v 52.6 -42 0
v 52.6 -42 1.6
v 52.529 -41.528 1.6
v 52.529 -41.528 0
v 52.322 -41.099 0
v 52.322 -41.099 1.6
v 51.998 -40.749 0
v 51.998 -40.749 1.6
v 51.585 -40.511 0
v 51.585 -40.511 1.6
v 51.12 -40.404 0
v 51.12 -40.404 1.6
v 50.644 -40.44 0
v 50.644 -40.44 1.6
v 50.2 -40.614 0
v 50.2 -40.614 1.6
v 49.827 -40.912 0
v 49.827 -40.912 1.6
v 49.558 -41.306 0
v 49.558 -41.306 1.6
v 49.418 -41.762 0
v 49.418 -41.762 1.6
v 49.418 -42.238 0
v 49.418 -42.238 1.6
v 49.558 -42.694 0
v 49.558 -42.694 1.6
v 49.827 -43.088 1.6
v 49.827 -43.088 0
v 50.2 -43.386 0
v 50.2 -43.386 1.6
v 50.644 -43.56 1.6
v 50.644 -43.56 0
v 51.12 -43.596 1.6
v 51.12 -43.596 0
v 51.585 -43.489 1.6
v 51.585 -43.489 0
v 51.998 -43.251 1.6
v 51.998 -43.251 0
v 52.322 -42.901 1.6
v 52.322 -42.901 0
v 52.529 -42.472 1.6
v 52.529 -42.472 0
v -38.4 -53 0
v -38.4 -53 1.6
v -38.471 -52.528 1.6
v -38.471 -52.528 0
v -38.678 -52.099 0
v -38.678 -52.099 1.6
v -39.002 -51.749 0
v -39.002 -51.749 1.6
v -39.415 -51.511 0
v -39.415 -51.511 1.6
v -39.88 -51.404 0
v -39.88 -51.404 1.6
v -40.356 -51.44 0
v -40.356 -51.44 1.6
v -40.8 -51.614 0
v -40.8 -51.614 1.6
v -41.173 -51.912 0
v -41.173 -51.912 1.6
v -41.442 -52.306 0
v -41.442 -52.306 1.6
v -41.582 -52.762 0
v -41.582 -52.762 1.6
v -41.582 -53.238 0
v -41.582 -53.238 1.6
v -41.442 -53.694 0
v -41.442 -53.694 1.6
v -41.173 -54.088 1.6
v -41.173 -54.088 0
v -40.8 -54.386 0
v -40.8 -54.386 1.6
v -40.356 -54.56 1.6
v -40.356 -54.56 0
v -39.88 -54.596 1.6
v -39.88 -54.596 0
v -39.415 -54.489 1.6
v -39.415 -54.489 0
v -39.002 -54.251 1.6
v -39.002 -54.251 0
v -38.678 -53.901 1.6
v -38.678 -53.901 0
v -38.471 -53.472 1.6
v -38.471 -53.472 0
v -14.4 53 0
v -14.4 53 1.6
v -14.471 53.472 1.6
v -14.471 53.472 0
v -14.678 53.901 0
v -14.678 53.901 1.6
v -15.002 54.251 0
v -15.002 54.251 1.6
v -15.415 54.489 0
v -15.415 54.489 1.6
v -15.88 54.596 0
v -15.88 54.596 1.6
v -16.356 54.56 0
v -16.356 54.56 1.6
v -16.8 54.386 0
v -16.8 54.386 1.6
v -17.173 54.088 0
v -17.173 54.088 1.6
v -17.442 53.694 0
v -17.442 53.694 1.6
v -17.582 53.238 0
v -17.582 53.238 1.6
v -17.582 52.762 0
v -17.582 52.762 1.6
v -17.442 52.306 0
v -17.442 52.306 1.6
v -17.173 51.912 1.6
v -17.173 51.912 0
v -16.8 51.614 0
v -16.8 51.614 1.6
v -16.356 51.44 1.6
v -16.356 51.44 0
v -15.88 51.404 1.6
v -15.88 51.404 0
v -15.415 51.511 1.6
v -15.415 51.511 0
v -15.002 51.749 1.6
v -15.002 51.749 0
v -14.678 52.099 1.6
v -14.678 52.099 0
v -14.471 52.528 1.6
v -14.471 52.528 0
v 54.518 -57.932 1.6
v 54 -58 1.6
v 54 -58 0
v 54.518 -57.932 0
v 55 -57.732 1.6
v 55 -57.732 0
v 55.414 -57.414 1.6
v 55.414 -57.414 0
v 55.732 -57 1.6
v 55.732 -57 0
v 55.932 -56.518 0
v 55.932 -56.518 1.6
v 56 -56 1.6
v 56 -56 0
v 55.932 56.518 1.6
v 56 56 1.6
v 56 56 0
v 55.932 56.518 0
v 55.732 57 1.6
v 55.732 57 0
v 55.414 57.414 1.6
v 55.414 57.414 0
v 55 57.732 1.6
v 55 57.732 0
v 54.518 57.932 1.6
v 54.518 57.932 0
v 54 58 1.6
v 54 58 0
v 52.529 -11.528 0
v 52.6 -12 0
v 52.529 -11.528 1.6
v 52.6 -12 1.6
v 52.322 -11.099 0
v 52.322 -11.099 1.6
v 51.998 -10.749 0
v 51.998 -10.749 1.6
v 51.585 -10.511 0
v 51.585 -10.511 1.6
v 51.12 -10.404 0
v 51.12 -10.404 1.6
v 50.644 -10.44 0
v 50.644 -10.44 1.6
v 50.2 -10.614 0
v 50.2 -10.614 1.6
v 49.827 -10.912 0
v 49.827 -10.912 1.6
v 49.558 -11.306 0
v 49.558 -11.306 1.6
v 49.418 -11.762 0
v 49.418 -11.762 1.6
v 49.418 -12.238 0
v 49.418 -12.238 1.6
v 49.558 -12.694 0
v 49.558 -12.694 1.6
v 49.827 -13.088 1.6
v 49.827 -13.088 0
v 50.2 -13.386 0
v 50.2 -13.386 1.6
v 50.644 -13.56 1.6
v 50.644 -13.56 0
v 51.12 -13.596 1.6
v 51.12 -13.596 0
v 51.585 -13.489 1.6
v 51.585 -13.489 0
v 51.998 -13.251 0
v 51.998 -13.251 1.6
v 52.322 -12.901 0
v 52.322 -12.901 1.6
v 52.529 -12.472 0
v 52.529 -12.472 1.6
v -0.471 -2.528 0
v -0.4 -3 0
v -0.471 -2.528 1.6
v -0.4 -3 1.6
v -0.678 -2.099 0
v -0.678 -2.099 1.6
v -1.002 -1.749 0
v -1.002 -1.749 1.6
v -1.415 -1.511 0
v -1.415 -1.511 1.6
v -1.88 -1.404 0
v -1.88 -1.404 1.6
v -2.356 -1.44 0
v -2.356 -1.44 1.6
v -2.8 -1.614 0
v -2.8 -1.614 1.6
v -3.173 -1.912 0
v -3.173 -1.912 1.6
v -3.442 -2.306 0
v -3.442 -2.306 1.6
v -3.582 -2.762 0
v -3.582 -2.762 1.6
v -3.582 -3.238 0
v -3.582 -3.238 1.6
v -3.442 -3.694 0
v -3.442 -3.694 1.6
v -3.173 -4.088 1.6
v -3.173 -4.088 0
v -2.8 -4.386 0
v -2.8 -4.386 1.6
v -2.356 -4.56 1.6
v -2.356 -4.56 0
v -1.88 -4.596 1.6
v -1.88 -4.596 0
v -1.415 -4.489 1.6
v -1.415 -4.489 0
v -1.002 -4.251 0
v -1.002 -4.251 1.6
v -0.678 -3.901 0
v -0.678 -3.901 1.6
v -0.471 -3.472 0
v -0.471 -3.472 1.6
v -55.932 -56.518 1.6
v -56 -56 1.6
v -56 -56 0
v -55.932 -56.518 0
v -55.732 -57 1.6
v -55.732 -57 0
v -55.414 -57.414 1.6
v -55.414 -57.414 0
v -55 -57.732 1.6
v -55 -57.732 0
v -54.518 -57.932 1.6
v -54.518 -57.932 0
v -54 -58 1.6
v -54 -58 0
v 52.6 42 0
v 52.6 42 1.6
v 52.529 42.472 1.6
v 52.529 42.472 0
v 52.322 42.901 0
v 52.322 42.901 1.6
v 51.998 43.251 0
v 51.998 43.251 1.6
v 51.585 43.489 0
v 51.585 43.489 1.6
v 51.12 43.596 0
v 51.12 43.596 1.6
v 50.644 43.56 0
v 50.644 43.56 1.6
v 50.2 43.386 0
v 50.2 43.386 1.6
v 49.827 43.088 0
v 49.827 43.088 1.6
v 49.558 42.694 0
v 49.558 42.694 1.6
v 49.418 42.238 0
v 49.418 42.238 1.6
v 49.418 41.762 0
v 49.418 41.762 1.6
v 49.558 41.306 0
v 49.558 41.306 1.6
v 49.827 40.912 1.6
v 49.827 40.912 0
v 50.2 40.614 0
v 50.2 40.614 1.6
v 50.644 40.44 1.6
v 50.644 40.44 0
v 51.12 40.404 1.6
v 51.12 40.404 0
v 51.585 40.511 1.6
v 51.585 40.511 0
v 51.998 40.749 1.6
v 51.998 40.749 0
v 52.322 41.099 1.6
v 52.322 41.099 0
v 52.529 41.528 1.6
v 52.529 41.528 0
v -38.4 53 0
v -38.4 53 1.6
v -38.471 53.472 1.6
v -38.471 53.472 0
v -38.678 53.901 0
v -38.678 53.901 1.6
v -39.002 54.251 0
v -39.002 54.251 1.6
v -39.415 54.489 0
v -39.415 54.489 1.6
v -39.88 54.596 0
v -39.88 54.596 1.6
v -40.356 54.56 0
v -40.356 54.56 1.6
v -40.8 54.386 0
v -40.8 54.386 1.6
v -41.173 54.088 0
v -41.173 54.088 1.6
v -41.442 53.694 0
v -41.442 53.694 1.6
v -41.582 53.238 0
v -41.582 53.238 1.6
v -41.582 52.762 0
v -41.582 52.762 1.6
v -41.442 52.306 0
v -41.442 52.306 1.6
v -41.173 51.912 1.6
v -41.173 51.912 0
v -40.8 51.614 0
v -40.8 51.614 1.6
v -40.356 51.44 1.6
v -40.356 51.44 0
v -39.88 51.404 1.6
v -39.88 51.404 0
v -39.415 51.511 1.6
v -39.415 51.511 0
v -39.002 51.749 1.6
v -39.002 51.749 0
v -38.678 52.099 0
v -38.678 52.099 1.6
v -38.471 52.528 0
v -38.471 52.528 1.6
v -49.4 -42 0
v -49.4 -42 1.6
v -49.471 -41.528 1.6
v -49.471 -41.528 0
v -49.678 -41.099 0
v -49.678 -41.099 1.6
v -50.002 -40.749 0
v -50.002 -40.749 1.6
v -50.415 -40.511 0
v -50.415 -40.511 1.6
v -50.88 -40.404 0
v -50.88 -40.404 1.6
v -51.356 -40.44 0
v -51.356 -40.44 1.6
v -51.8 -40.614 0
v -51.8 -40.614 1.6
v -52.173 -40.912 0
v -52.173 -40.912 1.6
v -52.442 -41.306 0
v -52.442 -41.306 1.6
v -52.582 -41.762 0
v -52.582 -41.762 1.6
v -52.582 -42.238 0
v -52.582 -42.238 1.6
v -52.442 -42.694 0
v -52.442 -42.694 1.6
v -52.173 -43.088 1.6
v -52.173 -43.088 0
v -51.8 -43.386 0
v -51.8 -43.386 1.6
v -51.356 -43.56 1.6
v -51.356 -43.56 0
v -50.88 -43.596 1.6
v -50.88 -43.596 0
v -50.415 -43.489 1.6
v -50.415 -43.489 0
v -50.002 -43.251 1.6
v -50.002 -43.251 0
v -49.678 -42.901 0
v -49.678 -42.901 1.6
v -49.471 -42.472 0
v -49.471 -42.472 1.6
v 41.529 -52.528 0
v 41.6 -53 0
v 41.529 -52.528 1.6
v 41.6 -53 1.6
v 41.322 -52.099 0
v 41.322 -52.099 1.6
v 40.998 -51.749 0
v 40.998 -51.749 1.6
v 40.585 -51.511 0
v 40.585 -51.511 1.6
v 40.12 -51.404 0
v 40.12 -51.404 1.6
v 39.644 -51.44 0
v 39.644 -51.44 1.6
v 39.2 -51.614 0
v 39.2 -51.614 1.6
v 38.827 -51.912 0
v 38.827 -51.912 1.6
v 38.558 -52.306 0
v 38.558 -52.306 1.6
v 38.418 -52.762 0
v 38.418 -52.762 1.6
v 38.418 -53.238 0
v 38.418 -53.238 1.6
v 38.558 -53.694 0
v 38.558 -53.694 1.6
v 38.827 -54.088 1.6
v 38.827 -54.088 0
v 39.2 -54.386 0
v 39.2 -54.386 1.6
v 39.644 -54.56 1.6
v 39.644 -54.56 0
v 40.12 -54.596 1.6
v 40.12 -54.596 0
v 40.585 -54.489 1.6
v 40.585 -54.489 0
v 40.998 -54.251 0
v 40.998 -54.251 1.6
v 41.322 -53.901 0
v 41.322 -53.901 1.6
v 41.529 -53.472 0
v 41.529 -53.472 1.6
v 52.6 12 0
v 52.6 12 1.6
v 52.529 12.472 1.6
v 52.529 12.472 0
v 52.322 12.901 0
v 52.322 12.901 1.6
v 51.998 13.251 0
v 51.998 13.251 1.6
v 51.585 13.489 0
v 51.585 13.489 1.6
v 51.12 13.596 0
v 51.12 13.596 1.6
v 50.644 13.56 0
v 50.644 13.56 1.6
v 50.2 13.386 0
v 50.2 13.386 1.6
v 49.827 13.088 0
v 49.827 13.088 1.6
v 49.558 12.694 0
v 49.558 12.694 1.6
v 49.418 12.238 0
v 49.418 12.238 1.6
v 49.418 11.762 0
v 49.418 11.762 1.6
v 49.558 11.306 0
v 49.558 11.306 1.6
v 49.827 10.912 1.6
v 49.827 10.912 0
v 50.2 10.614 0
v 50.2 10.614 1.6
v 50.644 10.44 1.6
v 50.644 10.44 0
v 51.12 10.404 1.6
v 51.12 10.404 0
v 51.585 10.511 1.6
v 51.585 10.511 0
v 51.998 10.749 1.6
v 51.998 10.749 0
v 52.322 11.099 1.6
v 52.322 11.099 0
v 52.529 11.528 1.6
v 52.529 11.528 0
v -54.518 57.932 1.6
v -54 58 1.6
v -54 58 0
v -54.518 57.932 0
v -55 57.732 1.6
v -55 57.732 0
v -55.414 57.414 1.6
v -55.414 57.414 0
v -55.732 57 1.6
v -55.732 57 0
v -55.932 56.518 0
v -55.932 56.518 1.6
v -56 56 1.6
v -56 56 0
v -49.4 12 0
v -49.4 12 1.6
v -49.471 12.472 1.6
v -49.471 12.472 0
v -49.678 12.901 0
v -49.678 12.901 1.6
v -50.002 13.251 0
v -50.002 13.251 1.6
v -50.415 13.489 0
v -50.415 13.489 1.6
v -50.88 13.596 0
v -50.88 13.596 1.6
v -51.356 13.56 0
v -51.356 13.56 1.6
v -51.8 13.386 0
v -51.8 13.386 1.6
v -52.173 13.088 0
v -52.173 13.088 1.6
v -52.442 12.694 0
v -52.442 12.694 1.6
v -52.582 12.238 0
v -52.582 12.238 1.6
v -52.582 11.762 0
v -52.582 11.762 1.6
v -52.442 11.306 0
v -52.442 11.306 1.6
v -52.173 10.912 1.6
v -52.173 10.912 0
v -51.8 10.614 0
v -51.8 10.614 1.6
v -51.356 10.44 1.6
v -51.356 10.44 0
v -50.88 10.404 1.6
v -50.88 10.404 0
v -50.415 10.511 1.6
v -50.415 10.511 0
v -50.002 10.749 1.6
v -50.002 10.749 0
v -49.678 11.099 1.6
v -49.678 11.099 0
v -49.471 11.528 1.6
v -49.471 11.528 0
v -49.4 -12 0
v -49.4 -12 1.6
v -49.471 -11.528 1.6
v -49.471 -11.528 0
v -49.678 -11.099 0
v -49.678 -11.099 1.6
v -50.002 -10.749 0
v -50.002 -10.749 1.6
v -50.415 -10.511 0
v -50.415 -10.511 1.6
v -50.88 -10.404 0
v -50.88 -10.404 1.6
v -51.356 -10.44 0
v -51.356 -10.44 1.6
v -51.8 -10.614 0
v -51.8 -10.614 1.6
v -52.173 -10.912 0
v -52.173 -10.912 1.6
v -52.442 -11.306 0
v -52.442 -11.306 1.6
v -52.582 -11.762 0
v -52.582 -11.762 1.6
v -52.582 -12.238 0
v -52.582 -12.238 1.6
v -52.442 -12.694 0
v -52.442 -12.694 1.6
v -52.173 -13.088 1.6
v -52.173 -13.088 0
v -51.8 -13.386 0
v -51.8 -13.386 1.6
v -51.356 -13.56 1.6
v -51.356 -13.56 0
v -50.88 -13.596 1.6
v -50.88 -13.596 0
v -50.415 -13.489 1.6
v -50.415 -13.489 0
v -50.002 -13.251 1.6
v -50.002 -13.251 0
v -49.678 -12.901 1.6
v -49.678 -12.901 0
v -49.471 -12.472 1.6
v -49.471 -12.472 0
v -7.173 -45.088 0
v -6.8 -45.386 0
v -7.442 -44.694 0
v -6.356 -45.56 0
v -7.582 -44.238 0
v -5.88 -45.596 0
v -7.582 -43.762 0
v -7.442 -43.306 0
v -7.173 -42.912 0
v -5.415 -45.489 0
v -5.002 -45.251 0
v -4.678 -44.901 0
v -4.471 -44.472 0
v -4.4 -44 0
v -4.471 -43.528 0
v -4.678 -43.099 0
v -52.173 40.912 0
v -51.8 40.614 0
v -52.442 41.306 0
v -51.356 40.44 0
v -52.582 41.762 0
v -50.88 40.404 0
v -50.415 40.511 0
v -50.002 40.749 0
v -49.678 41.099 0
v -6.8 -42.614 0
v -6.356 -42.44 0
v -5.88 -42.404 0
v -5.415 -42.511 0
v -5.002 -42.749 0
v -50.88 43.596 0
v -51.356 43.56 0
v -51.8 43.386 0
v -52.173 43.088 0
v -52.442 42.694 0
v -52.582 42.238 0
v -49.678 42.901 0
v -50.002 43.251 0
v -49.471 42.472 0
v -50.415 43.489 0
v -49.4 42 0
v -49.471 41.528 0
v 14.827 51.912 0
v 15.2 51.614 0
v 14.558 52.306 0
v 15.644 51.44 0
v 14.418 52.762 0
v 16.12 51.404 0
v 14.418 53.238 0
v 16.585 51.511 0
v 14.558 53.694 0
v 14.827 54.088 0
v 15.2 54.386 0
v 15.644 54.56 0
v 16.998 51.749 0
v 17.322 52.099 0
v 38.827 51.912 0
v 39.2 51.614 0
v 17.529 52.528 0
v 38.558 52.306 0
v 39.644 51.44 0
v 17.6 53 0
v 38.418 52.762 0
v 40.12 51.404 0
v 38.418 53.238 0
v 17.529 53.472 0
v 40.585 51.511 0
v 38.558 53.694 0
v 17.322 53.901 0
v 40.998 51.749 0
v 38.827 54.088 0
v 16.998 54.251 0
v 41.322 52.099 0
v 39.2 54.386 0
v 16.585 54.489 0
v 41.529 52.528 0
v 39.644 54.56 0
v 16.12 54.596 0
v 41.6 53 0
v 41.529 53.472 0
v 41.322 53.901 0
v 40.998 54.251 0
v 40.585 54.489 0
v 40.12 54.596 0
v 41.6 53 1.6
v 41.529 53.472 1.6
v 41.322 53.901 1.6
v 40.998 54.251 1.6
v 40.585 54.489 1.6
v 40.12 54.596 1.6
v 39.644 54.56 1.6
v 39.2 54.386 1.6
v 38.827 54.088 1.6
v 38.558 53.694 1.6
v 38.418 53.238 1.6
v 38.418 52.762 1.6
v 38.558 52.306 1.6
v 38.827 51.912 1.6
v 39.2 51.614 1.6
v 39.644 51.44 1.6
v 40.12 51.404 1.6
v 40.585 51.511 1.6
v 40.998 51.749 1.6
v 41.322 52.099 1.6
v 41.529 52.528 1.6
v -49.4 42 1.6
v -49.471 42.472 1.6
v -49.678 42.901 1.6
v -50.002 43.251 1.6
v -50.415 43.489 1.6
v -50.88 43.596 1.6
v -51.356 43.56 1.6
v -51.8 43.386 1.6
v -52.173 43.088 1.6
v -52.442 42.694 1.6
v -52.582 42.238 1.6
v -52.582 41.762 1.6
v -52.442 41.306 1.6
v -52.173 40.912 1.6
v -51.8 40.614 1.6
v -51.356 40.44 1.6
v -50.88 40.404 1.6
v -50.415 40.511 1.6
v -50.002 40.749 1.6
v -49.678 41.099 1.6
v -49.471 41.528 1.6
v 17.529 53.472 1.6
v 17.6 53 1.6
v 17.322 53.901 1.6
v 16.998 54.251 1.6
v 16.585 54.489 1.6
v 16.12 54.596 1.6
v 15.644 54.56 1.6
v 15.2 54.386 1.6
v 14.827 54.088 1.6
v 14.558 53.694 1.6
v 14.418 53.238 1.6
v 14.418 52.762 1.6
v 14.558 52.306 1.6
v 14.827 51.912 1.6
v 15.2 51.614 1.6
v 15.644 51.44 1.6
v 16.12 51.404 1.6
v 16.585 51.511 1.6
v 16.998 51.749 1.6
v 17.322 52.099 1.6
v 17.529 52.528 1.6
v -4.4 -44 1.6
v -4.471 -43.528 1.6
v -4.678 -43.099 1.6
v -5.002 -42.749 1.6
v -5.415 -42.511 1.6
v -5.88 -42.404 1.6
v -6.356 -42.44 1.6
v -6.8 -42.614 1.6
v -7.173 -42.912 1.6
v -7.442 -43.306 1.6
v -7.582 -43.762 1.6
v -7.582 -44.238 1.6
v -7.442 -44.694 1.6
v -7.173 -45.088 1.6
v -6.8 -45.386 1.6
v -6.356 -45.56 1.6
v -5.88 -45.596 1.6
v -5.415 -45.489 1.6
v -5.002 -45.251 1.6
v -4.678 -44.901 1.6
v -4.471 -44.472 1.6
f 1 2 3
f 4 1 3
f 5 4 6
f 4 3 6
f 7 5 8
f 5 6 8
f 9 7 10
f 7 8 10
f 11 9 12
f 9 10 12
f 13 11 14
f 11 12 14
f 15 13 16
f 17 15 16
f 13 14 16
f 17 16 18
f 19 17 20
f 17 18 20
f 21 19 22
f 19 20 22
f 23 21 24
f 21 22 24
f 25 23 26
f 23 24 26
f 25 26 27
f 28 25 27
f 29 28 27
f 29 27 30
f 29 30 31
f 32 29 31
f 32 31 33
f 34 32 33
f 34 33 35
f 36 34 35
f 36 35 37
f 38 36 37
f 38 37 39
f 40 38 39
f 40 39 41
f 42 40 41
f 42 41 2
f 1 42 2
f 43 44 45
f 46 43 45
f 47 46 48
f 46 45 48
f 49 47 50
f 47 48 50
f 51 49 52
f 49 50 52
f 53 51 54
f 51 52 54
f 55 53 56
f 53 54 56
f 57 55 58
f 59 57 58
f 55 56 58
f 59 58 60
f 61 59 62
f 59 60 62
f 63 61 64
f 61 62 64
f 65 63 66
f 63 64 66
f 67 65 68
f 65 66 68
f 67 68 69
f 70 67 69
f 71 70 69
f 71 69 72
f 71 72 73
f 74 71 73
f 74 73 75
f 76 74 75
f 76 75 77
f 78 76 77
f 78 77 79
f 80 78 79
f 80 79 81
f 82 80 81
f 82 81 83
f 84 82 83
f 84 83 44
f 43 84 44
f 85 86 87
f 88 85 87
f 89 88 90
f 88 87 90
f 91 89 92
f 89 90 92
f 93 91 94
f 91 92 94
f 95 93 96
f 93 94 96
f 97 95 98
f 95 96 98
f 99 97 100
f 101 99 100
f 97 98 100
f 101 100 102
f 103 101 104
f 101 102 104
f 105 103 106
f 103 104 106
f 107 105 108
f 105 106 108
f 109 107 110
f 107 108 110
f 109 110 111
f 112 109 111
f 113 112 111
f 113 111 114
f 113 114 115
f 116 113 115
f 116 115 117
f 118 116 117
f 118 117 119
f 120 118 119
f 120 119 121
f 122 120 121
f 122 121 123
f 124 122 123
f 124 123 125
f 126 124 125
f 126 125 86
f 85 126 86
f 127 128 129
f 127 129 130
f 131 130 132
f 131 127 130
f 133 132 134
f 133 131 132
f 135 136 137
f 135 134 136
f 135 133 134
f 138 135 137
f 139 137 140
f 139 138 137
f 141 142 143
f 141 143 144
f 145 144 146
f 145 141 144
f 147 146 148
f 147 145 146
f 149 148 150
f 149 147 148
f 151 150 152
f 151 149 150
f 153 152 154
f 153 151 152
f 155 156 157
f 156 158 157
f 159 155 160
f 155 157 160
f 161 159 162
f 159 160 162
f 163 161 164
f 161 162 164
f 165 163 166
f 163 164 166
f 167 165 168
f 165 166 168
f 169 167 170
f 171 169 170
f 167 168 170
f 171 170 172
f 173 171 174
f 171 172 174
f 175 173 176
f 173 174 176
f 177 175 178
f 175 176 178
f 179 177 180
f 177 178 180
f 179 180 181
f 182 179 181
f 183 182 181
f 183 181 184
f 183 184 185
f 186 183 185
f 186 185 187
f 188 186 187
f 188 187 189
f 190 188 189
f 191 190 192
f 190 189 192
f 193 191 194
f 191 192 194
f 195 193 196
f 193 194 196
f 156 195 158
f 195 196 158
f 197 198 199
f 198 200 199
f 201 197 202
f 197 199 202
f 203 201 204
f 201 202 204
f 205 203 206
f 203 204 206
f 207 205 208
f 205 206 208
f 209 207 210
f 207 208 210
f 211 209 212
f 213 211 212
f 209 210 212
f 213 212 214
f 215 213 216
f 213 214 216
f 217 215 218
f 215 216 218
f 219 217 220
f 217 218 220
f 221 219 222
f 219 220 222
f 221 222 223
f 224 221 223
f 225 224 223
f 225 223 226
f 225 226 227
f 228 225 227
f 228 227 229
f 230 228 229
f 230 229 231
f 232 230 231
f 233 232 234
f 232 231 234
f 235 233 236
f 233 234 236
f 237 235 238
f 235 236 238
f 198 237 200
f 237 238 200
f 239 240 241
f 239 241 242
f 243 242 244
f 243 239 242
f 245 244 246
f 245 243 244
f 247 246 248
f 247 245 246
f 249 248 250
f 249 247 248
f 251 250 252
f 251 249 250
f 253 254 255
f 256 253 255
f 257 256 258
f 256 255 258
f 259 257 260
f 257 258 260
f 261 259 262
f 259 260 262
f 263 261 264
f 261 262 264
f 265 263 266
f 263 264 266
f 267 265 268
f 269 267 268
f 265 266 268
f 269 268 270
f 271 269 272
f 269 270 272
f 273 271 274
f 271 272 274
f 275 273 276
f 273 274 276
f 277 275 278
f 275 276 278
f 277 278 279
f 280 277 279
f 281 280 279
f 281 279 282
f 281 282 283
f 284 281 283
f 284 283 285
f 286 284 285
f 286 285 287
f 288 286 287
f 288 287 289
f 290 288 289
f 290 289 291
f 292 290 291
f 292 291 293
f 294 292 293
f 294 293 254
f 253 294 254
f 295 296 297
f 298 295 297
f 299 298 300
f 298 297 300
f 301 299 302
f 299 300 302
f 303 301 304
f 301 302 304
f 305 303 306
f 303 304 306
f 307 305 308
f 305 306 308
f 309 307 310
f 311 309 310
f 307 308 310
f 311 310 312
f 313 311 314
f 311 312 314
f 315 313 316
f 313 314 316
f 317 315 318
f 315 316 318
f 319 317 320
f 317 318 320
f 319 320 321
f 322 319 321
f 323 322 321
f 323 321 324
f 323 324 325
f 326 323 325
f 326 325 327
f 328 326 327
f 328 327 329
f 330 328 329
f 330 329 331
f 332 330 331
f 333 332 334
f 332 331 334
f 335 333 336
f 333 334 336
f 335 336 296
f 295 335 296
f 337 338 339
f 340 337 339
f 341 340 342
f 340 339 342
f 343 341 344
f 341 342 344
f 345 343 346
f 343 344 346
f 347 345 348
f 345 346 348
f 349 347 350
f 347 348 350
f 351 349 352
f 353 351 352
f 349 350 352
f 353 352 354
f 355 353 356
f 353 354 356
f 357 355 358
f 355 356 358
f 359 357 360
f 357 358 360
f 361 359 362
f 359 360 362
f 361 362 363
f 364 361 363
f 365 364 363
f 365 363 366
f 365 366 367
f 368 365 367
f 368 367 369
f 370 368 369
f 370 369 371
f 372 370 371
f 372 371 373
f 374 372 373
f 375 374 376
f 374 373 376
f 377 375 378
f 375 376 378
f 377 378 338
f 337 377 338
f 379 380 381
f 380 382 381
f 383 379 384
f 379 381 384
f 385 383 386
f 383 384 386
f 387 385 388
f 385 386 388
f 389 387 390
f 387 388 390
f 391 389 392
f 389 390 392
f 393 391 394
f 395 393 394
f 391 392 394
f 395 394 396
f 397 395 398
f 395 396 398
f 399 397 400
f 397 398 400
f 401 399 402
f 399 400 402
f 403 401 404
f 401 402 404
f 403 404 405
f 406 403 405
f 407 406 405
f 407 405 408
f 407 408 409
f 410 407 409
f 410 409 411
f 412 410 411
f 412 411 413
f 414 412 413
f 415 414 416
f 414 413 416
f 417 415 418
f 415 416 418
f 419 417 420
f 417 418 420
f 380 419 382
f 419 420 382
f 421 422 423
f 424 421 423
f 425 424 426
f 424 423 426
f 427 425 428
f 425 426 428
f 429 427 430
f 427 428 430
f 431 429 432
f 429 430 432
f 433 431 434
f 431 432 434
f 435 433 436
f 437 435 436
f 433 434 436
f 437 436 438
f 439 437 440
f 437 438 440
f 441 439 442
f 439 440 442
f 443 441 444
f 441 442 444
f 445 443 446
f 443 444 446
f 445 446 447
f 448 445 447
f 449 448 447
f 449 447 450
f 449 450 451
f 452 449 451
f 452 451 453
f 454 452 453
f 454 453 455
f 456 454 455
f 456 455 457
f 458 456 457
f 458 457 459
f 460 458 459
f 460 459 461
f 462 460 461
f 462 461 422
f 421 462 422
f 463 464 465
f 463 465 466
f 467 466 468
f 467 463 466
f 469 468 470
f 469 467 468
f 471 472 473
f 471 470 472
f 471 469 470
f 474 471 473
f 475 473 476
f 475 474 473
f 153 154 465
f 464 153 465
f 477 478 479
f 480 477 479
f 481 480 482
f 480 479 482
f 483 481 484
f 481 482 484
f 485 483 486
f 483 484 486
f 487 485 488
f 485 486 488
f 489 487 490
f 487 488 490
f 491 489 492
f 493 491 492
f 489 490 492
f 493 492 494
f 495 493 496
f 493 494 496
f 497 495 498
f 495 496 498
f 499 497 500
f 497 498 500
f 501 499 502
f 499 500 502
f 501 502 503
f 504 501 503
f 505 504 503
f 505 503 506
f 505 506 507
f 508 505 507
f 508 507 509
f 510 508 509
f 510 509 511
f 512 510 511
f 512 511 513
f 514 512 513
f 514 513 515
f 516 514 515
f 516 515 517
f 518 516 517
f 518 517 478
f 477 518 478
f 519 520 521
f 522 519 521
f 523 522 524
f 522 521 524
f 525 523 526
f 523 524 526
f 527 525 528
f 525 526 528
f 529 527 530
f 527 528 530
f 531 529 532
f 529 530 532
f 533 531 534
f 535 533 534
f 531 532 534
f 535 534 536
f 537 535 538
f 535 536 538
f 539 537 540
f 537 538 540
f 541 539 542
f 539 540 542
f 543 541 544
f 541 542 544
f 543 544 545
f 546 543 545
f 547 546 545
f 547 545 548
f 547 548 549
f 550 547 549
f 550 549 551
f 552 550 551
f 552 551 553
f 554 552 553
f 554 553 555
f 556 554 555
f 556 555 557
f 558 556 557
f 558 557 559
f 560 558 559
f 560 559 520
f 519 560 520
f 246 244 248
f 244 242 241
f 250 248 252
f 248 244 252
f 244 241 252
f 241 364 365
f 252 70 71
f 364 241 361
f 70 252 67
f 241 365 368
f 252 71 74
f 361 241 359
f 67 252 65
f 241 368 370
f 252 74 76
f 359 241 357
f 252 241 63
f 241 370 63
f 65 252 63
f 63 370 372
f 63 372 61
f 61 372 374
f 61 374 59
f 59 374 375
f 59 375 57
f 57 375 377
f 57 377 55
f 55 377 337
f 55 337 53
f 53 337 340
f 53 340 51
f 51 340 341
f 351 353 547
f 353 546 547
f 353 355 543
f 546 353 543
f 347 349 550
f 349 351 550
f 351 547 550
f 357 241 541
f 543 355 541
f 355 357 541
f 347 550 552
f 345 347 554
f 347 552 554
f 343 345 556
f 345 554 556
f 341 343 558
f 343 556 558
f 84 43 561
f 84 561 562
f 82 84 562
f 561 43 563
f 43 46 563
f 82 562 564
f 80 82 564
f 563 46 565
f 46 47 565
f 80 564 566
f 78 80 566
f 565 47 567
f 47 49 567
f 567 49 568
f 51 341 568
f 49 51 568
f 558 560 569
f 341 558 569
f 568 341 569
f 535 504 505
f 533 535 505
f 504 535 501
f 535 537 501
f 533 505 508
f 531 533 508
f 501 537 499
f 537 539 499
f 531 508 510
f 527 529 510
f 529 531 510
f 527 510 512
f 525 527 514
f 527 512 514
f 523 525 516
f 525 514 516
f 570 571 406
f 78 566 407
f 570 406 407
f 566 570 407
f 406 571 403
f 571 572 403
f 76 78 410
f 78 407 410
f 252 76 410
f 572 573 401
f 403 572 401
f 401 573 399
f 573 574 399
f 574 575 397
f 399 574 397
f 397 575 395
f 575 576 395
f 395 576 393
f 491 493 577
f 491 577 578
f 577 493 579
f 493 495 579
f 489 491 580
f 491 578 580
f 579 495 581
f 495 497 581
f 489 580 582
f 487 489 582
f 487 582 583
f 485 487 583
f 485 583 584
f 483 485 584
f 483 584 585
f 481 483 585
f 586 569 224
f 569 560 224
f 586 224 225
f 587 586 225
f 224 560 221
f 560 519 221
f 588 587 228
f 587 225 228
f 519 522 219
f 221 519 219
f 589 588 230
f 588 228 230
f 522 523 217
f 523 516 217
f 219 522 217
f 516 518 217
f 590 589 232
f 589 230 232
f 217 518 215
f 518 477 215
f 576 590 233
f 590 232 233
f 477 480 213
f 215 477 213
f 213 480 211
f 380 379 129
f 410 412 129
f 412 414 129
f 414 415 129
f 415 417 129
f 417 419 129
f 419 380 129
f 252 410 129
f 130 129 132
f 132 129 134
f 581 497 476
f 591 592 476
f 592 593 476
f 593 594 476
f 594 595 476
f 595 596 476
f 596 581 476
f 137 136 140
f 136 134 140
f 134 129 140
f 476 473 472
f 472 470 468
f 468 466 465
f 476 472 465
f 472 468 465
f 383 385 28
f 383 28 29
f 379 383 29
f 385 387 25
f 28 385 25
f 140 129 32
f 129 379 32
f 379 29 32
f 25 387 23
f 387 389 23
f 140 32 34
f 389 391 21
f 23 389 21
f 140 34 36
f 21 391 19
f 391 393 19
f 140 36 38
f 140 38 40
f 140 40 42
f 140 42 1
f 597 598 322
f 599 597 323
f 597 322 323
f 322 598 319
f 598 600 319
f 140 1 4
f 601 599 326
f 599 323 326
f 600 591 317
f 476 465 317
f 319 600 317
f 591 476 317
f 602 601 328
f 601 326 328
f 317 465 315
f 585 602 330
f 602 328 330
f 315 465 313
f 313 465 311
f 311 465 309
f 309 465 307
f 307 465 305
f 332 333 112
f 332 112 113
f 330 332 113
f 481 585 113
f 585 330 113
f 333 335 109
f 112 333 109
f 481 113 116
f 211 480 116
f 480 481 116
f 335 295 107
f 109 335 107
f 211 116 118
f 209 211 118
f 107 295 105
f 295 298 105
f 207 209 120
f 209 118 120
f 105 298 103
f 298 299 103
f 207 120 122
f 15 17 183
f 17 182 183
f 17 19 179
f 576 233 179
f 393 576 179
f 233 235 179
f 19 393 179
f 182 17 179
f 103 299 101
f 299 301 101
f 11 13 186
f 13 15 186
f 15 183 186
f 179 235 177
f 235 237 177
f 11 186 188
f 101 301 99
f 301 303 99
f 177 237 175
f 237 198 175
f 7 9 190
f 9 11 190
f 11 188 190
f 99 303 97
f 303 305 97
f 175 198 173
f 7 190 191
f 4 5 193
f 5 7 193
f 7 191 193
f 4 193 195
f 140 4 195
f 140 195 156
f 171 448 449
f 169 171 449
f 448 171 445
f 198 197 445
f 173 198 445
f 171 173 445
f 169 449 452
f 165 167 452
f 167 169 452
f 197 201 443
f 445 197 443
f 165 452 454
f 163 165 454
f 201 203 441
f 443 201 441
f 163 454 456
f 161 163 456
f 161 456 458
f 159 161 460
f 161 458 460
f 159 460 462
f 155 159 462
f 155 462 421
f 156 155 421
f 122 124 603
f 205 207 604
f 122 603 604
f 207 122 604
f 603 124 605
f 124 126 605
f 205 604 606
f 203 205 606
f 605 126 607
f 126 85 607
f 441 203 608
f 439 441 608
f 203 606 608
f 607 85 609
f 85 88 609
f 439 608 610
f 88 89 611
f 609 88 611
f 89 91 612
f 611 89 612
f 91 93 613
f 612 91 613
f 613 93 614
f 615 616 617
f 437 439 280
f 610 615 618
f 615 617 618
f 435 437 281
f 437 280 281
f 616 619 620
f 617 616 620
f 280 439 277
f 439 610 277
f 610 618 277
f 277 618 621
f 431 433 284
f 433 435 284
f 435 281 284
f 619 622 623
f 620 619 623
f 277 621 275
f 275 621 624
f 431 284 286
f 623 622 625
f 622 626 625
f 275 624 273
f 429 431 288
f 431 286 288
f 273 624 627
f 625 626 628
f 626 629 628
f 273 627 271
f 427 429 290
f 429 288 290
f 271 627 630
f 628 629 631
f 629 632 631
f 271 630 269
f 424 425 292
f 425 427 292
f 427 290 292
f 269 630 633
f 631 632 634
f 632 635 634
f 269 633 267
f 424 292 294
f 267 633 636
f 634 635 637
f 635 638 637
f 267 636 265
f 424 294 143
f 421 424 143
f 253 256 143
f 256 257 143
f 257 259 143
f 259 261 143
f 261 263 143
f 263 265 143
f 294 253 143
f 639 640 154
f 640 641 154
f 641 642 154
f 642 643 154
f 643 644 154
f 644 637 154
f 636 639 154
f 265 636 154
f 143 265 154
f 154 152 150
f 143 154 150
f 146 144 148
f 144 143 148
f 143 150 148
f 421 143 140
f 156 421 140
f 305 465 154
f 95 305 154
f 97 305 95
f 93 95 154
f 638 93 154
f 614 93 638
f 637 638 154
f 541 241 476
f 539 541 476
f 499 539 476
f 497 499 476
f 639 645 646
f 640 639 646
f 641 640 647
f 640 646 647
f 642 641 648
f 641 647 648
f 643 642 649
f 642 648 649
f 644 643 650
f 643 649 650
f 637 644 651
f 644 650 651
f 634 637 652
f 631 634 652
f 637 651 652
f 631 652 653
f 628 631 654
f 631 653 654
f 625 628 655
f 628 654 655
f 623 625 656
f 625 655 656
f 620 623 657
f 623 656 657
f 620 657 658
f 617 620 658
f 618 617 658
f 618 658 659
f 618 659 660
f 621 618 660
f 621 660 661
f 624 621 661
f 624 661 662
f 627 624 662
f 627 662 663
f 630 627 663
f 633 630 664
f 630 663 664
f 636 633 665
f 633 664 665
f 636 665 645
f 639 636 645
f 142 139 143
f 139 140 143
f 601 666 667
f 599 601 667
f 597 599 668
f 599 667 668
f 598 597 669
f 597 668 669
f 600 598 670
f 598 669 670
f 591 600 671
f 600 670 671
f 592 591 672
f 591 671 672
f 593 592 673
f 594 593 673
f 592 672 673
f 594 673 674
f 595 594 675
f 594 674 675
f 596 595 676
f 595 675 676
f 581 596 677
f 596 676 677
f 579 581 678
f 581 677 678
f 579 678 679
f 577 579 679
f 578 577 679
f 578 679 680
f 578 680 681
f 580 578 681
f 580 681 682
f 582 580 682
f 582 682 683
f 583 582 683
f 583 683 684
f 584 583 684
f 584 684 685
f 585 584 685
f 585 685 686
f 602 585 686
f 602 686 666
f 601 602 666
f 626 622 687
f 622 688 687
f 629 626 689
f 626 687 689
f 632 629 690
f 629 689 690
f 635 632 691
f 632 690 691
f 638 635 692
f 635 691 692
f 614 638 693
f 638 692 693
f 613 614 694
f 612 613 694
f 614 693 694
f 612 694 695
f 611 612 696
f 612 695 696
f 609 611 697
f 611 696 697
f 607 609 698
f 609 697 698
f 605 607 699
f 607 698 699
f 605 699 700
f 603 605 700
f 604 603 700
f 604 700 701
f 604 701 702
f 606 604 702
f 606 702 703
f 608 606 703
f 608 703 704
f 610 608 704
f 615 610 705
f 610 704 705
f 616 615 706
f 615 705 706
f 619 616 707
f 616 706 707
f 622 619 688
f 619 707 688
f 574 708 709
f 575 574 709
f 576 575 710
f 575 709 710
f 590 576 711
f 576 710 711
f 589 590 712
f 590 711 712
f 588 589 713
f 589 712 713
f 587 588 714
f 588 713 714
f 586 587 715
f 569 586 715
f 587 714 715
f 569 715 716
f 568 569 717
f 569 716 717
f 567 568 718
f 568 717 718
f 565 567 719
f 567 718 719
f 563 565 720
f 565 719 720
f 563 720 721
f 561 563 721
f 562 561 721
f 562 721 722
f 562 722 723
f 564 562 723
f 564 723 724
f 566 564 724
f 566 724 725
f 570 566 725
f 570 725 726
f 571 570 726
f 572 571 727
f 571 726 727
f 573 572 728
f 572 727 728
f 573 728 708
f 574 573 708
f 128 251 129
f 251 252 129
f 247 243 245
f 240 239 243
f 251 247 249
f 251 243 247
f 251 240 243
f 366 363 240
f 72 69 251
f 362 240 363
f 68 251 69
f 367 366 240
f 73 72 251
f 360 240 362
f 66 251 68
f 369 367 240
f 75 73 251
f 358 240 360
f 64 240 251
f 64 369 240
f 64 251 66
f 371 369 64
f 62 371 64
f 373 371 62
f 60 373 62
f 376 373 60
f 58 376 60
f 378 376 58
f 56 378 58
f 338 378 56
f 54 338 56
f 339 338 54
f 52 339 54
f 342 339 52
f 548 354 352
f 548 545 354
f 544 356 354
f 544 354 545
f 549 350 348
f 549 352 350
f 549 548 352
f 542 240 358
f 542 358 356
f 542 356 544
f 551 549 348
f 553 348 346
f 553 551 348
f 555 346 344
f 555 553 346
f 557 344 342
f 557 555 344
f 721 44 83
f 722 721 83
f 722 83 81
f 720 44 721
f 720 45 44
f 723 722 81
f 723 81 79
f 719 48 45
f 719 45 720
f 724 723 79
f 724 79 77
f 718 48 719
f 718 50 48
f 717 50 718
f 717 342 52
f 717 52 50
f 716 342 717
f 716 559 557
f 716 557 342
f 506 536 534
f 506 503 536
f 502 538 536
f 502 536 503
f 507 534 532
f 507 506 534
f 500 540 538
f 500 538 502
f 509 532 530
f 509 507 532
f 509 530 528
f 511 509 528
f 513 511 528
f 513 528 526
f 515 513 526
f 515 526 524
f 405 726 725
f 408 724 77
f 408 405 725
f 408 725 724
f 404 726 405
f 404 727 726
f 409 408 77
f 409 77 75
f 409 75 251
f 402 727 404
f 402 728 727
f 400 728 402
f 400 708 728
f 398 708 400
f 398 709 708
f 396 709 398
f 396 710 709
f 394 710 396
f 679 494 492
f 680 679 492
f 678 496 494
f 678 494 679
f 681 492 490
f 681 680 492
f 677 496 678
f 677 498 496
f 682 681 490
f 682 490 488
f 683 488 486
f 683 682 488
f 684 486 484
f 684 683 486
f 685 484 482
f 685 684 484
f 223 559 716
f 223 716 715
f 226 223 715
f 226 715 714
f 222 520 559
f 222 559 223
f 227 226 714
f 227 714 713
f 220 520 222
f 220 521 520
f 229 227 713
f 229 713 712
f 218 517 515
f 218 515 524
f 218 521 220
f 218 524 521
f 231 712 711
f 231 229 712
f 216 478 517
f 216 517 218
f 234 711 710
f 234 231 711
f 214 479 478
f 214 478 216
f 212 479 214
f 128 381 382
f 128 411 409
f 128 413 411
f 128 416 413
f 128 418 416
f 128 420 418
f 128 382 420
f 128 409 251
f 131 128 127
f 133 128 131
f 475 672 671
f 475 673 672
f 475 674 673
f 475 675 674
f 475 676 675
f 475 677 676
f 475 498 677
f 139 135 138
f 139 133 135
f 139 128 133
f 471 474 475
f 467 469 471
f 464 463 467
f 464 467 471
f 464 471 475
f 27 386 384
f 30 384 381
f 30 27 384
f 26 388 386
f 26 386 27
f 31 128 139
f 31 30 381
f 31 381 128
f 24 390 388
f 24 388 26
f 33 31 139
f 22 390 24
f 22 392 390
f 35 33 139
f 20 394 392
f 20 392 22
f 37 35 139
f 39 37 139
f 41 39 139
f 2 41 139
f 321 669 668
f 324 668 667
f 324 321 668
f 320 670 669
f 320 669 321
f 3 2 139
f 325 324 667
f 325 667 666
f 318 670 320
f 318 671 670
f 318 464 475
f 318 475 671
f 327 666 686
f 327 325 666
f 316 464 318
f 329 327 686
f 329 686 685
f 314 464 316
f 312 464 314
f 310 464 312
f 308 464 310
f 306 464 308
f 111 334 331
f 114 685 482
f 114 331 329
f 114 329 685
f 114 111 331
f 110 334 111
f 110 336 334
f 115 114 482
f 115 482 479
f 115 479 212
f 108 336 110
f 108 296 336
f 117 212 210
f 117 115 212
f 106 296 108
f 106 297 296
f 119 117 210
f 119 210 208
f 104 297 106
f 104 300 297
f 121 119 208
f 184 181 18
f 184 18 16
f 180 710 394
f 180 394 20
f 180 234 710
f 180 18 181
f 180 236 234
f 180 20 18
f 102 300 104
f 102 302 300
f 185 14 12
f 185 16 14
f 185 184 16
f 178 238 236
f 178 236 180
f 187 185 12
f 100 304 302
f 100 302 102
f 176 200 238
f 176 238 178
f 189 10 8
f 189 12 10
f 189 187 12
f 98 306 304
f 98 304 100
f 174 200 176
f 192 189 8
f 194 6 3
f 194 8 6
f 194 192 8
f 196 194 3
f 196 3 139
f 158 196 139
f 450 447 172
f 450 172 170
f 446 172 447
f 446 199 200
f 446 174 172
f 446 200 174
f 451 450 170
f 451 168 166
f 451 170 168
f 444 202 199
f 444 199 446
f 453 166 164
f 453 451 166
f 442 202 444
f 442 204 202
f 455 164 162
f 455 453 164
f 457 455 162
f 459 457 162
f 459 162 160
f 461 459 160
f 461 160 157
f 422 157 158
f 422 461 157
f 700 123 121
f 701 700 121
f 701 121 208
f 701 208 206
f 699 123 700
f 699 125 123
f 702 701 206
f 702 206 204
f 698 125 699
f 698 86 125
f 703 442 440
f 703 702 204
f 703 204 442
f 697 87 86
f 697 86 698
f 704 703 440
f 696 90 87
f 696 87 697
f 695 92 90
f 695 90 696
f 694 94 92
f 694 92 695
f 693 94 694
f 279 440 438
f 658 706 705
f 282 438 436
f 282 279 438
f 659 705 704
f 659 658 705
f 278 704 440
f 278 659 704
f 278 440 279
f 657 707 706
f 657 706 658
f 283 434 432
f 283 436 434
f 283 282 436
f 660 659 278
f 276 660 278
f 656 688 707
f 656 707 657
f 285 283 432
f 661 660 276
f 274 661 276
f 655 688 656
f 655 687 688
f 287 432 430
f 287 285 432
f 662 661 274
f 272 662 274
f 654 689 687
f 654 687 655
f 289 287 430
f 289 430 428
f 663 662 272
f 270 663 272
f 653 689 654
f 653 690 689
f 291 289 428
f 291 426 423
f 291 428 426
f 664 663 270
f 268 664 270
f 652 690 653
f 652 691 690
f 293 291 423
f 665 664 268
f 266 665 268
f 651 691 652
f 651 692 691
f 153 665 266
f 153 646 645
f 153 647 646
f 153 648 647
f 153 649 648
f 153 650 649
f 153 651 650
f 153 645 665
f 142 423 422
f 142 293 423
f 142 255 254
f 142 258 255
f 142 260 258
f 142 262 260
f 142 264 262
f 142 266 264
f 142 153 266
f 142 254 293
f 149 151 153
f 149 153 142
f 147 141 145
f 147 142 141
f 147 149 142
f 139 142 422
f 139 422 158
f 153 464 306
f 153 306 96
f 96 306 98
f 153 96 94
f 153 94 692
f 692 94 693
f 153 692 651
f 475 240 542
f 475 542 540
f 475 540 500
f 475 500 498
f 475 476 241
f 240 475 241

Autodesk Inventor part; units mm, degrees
ref_plane "YZ Plane" through (0, 0, 0) normal (1, 0, 0) x (0, 1, 0)
ref_plane "XZ Plane" through (0, 0, 0) normal (0, 1, 0) x (-1, 0, 0)
ref_plane "XY Plane" through (0, 0, 0) normal (0, 0, 1) x (1, 0, 0)
sketch "Sketch1" plane through (0, 0, 0) normal (0, 0, 1) x (1, 0, 0)
  line L0 (-56, -58) -> (56, -58)
  line L1 (56, -58) -> (56, 58)
  line L2 (56, 58) -> (-56, 58)
  line L3 (-56, 58) -> (-56, -58)
  line L4 (-56, -58) -> (56, 58) construction
  line L5 (56, -58) -> (-56, 58) construction
  point P0 (0, 0)
  dimension "d0" = 116
  dimension "d1" = 112
extrude "Extrusion1" add sketch "Sketch1" along normal blind 1.6
fillet "Fillet1" radius 2 4 edges at (-56, 58, 0.8) (-56, -58, 0.8) (56, -58, 0.8) (56, 58, 0.8)
sketch "Sketch5" plane through (0, 0, 1.6) normal (0, 0, 1) x (1, 0, 0)
  circle A0 centre (-2, -3) radius 1.6
  circle A1 centre (-6, -44) radius 1.6
  circle A2 centre (40, -53) radius 1.6
  circle A3 centre (51, -42) radius 1.6
  circle A4 centre (51, -12) radius 1.6
  line L0 (56, -56) -> (56, 56) construction
  line L1 (-54, -58) -> (54, -58) construction
  line L2 (0, 81.2) -> (0, -81.2) construction
  line L3 (-78.4, 0) -> (78.4, 0) construction
  circle A5 centre (-40, -53) radius 1.6
  circle A6 centre (-51, -42) radius 1.6
  circle A7 centre (-51, -12) radius 1.6
  circle A8 centre (40, 53) radius 1.6
  circle A9 centre (51, 42) radius 1.6
  circle A10 centre (51, 12) radius 1.6
  line L4 (-54, 58) -> (54, 58) construction
  circle A11 centre (-51, 12) radius 1.6
  circle A12 centre (-51, 42) radius 1.6
  circle A13 centre (-40, 53) radius 1.6
  circle A14 centre (16, 53) radius 1.6
  circle A15 centre (-16, 53) radius 1.6
  point P0 (0, 0)
  point P1 (-56, -56)
  point P2 (-56, 56)
  dimension "d19" = 44
  dimension "d20" = 6
  dimension "d21" = 3
  dimension "d22" = 2
  dimension "d23" = 5
  dimension "d24" = 5
  dimension "d25" = 5
  dimension "d27" = 3.2
  dimension "d28" = 3.2
  dimension "d29" = 3.2
  dimension "d31" = 3.2
  dimension "d32" = 3.2
  dimension "d33" = 16
  dimension "d34" = 16
  dimension "d35" = 12
  dimension "d36" = 3.2
  dimension "d37" = 3.2
  dimension "d38" = 5
  dimension "d39" = 5
  dimension "d40" = 16
  dimension "d41" = 16
extrude "Extrusion4" cut sketch "Sketch5" against normal through all
sketch "OCU_PCB_OUTLINE" plane through (0, 0, 1.6) normal (0, 0, 1) x (1, 0, 0)
  circle A0 centre (18.0683, -23.4912) radius 0.7836 projected
  circle A1 centre (-27.1869, 27.3078) radius 0.7836 projected
  circle A2 centre (18.0683, 27.3078) radius 0.7836 projected
  line L0 (32.6352, -42.846) -> (12.62, -42.846) projected
  line L1 (32.6352, -42.846) -> (12.62, -42.846) projected
  arc A3 (32.6352, -42.846) -> (39.7472, -35.734) centre (32.6352, -35.734) ccw projected
  line L2 (39.7472, -12.62) -> (39.7472, -35.734) projected
  arc A4 (39.7472, -12.62) -> (32.6352, -5.508) centre (32.6352, -12.62) ccw projected
  line L3 (12.62, -5.508) -> (32.6352, -5.508) projected
  arc A5 (12.62, -5.508) -> (5.508, -12.62) centre (12.62, -12.62) ccw projected
  line L4 (5.508, -35.734) -> (5.508, -12.62) projected
  arc A6 (5.508, -35.734) -> (12.62, -42.846) centre (12.62, -35.734) ccw projected
  arc A7 (-16.9126, -36.0388) -> (-5.4826, -24.6088) centre (-16.9126, -24.6088) ccw projected
  arc A8 (-16.9126, -36.0388) -> (-5.4826, -24.6088) centre (-16.9126, -24.6088) ccw projected
  line L5 (-5.4826, -21.0528) -> (-5.4826, -24.6088) projected
  arc A9 (-5.4826, -21.0528) -> (-16.9126, -9.6228) centre (-16.9126, -21.0528) ccw projected
  line L6 (-28.3426, -9.6228) -> (-16.9126, -9.6228) projected
  arc A10 (-28.3426, -9.6228) -> (-39.7726, -21.0528) centre (-28.3426, -21.0528) ccw projected
  line L7 (-39.7726, -24.6088) -> (-39.7726, -21.0528) projected
  arc A11 (-39.7726, -24.6088) -> (-28.3426, -36.0388) centre (-28.3426, -24.6088) ccw projected
  line L8 (-16.9126, -36.0388) -> (-28.3426, -36.0388) projected
  arc A12 (-12.62, 3.508) -> (-5.508, 10.62) centre (-12.62, 10.62) ccw projected
  arc A13 (-12.62, 3.508) -> (-5.508, 10.62) centre (-12.62, 10.62) ccw projected
  line L9 (-5.508, 38.179) -> (-5.508, 10.62) projected
  arc A14 (-5.508, 38.179) -> (-12.62, 45.291) centre (-12.62, 38.179) ccw projected
  line L10 (-32.6352, 45.291) -> (-12.62, 45.291) projected
  arc A15 (-32.6352, 45.291) -> (-39.7472, 38.179) centre (-32.6352, 38.179) ccw projected
  line L11 (-39.7472, 10.62) -> (-39.7472, 38.179) projected
  arc A16 (-39.7472, 10.62) -> (-32.6352, 3.508) centre (-32.6352, 10.62) ccw projected
  line L12 (-12.62, 3.508) -> (-32.6352, 3.508) projected
  arc A17 (5, 10.62) -> (12.62, 3) centre (12.62, 10.62) ccw projected
  arc A18 (5, 10.62) -> (12.62, 3) centre (12.62, 10.62) ccw projected
  line L13 (32.6352, 3) -> (12.62, 3) projected
  arc A19 (32.6352, 3) -> (40.2552, 10.62) centre (32.6352, 10.62) ccw projected
  line L14 (40.2552, 38.179) -> (40.2552, 10.62) projected
  arc A20 (40.2552, 38.179) -> (32.6352, 45.799) centre (32.6352, 38.179) ccw projected
  line L15 (12.62, 45.799) -> (32.6352, 45.799) projected
  arc A21 (12.62, 45.799) -> (5, 38.179) centre (12.62, 38.179) ccw projected
  line L16 (5, 10.62) -> (5, 38.179) projected
  circle A22 centre (-19.8971, -23.4785) radius 0.7836 projected
  circle A23 centre (51, -42) radius 1.6 projected
  circle A24 centre (-51, -42) radius 1.6 projected
  circle A25 centre (-51, 42) radius 1.6 projected
  circle A26 centre (51, 42) radius 1.6 projected
  circle A27 centre (40, 53) radius 1.6 projected
  circle A28 centre (-51, 12) radius 1.6 projected
  circle A29 centre (-40, -53) radius 1.6 projected
  circle A30 centre (40, -53) radius 1.6 projected
  circle A31 centre (51, -12) radius 1.6 projected
  circle A32 centre (-51, -12) radius 1.6 projected
  circle A33 centre (-40, 53) radius 1.6 projected
  circle A34 centre (51, 12) radius 1.6 projected
  circle A35 centre (16, 53) radius 1.6 projected
  circle A36 centre (-2, -3) radius 1.6 projected
  circle A37 centre (-6, -44) radius 1.6 projected
  circle A38 centre (-16, 53) radius 1.6 projected
  arc A39 (56, 56) -> (54, 58) centre (54, 56) ccw projected
  line L17 (54, 58) -> (-54, 58) projected
  arc A40 (-54, 58) -> (-56, 56) centre (-54, 56) ccw projected
  line L18 (-56, 56) -> (-56, -56) projected
  arc A41 (-56, -56) -> (-54, -58) centre (-54, -56) ccw projected
  line L19 (-54, -58) -> (54, -58) projected
  arc A42 (54, -58) -> (56, -56) centre (54, -56) ccw projected
  line L20 (56, -56) -> (56, 56) projected
  point P0 (0, 0)
equation "\"d24\" = d23"
equation "\"d25\" = d23"
equation "\"d28\" = d27"
equation "\"d29\" = d27"
equation "\"d31\" = d27"
equation "\"d32\" = d27"
equation "\"d36\" = d27"
equation "\"d37\" = d27"
equation "\"d38\" = d23"
equation "\"d39\" = d23"
equation "\"d40\" = d34"
equation "\"d41\" = d34"
properties part number "OCU_PCB"
